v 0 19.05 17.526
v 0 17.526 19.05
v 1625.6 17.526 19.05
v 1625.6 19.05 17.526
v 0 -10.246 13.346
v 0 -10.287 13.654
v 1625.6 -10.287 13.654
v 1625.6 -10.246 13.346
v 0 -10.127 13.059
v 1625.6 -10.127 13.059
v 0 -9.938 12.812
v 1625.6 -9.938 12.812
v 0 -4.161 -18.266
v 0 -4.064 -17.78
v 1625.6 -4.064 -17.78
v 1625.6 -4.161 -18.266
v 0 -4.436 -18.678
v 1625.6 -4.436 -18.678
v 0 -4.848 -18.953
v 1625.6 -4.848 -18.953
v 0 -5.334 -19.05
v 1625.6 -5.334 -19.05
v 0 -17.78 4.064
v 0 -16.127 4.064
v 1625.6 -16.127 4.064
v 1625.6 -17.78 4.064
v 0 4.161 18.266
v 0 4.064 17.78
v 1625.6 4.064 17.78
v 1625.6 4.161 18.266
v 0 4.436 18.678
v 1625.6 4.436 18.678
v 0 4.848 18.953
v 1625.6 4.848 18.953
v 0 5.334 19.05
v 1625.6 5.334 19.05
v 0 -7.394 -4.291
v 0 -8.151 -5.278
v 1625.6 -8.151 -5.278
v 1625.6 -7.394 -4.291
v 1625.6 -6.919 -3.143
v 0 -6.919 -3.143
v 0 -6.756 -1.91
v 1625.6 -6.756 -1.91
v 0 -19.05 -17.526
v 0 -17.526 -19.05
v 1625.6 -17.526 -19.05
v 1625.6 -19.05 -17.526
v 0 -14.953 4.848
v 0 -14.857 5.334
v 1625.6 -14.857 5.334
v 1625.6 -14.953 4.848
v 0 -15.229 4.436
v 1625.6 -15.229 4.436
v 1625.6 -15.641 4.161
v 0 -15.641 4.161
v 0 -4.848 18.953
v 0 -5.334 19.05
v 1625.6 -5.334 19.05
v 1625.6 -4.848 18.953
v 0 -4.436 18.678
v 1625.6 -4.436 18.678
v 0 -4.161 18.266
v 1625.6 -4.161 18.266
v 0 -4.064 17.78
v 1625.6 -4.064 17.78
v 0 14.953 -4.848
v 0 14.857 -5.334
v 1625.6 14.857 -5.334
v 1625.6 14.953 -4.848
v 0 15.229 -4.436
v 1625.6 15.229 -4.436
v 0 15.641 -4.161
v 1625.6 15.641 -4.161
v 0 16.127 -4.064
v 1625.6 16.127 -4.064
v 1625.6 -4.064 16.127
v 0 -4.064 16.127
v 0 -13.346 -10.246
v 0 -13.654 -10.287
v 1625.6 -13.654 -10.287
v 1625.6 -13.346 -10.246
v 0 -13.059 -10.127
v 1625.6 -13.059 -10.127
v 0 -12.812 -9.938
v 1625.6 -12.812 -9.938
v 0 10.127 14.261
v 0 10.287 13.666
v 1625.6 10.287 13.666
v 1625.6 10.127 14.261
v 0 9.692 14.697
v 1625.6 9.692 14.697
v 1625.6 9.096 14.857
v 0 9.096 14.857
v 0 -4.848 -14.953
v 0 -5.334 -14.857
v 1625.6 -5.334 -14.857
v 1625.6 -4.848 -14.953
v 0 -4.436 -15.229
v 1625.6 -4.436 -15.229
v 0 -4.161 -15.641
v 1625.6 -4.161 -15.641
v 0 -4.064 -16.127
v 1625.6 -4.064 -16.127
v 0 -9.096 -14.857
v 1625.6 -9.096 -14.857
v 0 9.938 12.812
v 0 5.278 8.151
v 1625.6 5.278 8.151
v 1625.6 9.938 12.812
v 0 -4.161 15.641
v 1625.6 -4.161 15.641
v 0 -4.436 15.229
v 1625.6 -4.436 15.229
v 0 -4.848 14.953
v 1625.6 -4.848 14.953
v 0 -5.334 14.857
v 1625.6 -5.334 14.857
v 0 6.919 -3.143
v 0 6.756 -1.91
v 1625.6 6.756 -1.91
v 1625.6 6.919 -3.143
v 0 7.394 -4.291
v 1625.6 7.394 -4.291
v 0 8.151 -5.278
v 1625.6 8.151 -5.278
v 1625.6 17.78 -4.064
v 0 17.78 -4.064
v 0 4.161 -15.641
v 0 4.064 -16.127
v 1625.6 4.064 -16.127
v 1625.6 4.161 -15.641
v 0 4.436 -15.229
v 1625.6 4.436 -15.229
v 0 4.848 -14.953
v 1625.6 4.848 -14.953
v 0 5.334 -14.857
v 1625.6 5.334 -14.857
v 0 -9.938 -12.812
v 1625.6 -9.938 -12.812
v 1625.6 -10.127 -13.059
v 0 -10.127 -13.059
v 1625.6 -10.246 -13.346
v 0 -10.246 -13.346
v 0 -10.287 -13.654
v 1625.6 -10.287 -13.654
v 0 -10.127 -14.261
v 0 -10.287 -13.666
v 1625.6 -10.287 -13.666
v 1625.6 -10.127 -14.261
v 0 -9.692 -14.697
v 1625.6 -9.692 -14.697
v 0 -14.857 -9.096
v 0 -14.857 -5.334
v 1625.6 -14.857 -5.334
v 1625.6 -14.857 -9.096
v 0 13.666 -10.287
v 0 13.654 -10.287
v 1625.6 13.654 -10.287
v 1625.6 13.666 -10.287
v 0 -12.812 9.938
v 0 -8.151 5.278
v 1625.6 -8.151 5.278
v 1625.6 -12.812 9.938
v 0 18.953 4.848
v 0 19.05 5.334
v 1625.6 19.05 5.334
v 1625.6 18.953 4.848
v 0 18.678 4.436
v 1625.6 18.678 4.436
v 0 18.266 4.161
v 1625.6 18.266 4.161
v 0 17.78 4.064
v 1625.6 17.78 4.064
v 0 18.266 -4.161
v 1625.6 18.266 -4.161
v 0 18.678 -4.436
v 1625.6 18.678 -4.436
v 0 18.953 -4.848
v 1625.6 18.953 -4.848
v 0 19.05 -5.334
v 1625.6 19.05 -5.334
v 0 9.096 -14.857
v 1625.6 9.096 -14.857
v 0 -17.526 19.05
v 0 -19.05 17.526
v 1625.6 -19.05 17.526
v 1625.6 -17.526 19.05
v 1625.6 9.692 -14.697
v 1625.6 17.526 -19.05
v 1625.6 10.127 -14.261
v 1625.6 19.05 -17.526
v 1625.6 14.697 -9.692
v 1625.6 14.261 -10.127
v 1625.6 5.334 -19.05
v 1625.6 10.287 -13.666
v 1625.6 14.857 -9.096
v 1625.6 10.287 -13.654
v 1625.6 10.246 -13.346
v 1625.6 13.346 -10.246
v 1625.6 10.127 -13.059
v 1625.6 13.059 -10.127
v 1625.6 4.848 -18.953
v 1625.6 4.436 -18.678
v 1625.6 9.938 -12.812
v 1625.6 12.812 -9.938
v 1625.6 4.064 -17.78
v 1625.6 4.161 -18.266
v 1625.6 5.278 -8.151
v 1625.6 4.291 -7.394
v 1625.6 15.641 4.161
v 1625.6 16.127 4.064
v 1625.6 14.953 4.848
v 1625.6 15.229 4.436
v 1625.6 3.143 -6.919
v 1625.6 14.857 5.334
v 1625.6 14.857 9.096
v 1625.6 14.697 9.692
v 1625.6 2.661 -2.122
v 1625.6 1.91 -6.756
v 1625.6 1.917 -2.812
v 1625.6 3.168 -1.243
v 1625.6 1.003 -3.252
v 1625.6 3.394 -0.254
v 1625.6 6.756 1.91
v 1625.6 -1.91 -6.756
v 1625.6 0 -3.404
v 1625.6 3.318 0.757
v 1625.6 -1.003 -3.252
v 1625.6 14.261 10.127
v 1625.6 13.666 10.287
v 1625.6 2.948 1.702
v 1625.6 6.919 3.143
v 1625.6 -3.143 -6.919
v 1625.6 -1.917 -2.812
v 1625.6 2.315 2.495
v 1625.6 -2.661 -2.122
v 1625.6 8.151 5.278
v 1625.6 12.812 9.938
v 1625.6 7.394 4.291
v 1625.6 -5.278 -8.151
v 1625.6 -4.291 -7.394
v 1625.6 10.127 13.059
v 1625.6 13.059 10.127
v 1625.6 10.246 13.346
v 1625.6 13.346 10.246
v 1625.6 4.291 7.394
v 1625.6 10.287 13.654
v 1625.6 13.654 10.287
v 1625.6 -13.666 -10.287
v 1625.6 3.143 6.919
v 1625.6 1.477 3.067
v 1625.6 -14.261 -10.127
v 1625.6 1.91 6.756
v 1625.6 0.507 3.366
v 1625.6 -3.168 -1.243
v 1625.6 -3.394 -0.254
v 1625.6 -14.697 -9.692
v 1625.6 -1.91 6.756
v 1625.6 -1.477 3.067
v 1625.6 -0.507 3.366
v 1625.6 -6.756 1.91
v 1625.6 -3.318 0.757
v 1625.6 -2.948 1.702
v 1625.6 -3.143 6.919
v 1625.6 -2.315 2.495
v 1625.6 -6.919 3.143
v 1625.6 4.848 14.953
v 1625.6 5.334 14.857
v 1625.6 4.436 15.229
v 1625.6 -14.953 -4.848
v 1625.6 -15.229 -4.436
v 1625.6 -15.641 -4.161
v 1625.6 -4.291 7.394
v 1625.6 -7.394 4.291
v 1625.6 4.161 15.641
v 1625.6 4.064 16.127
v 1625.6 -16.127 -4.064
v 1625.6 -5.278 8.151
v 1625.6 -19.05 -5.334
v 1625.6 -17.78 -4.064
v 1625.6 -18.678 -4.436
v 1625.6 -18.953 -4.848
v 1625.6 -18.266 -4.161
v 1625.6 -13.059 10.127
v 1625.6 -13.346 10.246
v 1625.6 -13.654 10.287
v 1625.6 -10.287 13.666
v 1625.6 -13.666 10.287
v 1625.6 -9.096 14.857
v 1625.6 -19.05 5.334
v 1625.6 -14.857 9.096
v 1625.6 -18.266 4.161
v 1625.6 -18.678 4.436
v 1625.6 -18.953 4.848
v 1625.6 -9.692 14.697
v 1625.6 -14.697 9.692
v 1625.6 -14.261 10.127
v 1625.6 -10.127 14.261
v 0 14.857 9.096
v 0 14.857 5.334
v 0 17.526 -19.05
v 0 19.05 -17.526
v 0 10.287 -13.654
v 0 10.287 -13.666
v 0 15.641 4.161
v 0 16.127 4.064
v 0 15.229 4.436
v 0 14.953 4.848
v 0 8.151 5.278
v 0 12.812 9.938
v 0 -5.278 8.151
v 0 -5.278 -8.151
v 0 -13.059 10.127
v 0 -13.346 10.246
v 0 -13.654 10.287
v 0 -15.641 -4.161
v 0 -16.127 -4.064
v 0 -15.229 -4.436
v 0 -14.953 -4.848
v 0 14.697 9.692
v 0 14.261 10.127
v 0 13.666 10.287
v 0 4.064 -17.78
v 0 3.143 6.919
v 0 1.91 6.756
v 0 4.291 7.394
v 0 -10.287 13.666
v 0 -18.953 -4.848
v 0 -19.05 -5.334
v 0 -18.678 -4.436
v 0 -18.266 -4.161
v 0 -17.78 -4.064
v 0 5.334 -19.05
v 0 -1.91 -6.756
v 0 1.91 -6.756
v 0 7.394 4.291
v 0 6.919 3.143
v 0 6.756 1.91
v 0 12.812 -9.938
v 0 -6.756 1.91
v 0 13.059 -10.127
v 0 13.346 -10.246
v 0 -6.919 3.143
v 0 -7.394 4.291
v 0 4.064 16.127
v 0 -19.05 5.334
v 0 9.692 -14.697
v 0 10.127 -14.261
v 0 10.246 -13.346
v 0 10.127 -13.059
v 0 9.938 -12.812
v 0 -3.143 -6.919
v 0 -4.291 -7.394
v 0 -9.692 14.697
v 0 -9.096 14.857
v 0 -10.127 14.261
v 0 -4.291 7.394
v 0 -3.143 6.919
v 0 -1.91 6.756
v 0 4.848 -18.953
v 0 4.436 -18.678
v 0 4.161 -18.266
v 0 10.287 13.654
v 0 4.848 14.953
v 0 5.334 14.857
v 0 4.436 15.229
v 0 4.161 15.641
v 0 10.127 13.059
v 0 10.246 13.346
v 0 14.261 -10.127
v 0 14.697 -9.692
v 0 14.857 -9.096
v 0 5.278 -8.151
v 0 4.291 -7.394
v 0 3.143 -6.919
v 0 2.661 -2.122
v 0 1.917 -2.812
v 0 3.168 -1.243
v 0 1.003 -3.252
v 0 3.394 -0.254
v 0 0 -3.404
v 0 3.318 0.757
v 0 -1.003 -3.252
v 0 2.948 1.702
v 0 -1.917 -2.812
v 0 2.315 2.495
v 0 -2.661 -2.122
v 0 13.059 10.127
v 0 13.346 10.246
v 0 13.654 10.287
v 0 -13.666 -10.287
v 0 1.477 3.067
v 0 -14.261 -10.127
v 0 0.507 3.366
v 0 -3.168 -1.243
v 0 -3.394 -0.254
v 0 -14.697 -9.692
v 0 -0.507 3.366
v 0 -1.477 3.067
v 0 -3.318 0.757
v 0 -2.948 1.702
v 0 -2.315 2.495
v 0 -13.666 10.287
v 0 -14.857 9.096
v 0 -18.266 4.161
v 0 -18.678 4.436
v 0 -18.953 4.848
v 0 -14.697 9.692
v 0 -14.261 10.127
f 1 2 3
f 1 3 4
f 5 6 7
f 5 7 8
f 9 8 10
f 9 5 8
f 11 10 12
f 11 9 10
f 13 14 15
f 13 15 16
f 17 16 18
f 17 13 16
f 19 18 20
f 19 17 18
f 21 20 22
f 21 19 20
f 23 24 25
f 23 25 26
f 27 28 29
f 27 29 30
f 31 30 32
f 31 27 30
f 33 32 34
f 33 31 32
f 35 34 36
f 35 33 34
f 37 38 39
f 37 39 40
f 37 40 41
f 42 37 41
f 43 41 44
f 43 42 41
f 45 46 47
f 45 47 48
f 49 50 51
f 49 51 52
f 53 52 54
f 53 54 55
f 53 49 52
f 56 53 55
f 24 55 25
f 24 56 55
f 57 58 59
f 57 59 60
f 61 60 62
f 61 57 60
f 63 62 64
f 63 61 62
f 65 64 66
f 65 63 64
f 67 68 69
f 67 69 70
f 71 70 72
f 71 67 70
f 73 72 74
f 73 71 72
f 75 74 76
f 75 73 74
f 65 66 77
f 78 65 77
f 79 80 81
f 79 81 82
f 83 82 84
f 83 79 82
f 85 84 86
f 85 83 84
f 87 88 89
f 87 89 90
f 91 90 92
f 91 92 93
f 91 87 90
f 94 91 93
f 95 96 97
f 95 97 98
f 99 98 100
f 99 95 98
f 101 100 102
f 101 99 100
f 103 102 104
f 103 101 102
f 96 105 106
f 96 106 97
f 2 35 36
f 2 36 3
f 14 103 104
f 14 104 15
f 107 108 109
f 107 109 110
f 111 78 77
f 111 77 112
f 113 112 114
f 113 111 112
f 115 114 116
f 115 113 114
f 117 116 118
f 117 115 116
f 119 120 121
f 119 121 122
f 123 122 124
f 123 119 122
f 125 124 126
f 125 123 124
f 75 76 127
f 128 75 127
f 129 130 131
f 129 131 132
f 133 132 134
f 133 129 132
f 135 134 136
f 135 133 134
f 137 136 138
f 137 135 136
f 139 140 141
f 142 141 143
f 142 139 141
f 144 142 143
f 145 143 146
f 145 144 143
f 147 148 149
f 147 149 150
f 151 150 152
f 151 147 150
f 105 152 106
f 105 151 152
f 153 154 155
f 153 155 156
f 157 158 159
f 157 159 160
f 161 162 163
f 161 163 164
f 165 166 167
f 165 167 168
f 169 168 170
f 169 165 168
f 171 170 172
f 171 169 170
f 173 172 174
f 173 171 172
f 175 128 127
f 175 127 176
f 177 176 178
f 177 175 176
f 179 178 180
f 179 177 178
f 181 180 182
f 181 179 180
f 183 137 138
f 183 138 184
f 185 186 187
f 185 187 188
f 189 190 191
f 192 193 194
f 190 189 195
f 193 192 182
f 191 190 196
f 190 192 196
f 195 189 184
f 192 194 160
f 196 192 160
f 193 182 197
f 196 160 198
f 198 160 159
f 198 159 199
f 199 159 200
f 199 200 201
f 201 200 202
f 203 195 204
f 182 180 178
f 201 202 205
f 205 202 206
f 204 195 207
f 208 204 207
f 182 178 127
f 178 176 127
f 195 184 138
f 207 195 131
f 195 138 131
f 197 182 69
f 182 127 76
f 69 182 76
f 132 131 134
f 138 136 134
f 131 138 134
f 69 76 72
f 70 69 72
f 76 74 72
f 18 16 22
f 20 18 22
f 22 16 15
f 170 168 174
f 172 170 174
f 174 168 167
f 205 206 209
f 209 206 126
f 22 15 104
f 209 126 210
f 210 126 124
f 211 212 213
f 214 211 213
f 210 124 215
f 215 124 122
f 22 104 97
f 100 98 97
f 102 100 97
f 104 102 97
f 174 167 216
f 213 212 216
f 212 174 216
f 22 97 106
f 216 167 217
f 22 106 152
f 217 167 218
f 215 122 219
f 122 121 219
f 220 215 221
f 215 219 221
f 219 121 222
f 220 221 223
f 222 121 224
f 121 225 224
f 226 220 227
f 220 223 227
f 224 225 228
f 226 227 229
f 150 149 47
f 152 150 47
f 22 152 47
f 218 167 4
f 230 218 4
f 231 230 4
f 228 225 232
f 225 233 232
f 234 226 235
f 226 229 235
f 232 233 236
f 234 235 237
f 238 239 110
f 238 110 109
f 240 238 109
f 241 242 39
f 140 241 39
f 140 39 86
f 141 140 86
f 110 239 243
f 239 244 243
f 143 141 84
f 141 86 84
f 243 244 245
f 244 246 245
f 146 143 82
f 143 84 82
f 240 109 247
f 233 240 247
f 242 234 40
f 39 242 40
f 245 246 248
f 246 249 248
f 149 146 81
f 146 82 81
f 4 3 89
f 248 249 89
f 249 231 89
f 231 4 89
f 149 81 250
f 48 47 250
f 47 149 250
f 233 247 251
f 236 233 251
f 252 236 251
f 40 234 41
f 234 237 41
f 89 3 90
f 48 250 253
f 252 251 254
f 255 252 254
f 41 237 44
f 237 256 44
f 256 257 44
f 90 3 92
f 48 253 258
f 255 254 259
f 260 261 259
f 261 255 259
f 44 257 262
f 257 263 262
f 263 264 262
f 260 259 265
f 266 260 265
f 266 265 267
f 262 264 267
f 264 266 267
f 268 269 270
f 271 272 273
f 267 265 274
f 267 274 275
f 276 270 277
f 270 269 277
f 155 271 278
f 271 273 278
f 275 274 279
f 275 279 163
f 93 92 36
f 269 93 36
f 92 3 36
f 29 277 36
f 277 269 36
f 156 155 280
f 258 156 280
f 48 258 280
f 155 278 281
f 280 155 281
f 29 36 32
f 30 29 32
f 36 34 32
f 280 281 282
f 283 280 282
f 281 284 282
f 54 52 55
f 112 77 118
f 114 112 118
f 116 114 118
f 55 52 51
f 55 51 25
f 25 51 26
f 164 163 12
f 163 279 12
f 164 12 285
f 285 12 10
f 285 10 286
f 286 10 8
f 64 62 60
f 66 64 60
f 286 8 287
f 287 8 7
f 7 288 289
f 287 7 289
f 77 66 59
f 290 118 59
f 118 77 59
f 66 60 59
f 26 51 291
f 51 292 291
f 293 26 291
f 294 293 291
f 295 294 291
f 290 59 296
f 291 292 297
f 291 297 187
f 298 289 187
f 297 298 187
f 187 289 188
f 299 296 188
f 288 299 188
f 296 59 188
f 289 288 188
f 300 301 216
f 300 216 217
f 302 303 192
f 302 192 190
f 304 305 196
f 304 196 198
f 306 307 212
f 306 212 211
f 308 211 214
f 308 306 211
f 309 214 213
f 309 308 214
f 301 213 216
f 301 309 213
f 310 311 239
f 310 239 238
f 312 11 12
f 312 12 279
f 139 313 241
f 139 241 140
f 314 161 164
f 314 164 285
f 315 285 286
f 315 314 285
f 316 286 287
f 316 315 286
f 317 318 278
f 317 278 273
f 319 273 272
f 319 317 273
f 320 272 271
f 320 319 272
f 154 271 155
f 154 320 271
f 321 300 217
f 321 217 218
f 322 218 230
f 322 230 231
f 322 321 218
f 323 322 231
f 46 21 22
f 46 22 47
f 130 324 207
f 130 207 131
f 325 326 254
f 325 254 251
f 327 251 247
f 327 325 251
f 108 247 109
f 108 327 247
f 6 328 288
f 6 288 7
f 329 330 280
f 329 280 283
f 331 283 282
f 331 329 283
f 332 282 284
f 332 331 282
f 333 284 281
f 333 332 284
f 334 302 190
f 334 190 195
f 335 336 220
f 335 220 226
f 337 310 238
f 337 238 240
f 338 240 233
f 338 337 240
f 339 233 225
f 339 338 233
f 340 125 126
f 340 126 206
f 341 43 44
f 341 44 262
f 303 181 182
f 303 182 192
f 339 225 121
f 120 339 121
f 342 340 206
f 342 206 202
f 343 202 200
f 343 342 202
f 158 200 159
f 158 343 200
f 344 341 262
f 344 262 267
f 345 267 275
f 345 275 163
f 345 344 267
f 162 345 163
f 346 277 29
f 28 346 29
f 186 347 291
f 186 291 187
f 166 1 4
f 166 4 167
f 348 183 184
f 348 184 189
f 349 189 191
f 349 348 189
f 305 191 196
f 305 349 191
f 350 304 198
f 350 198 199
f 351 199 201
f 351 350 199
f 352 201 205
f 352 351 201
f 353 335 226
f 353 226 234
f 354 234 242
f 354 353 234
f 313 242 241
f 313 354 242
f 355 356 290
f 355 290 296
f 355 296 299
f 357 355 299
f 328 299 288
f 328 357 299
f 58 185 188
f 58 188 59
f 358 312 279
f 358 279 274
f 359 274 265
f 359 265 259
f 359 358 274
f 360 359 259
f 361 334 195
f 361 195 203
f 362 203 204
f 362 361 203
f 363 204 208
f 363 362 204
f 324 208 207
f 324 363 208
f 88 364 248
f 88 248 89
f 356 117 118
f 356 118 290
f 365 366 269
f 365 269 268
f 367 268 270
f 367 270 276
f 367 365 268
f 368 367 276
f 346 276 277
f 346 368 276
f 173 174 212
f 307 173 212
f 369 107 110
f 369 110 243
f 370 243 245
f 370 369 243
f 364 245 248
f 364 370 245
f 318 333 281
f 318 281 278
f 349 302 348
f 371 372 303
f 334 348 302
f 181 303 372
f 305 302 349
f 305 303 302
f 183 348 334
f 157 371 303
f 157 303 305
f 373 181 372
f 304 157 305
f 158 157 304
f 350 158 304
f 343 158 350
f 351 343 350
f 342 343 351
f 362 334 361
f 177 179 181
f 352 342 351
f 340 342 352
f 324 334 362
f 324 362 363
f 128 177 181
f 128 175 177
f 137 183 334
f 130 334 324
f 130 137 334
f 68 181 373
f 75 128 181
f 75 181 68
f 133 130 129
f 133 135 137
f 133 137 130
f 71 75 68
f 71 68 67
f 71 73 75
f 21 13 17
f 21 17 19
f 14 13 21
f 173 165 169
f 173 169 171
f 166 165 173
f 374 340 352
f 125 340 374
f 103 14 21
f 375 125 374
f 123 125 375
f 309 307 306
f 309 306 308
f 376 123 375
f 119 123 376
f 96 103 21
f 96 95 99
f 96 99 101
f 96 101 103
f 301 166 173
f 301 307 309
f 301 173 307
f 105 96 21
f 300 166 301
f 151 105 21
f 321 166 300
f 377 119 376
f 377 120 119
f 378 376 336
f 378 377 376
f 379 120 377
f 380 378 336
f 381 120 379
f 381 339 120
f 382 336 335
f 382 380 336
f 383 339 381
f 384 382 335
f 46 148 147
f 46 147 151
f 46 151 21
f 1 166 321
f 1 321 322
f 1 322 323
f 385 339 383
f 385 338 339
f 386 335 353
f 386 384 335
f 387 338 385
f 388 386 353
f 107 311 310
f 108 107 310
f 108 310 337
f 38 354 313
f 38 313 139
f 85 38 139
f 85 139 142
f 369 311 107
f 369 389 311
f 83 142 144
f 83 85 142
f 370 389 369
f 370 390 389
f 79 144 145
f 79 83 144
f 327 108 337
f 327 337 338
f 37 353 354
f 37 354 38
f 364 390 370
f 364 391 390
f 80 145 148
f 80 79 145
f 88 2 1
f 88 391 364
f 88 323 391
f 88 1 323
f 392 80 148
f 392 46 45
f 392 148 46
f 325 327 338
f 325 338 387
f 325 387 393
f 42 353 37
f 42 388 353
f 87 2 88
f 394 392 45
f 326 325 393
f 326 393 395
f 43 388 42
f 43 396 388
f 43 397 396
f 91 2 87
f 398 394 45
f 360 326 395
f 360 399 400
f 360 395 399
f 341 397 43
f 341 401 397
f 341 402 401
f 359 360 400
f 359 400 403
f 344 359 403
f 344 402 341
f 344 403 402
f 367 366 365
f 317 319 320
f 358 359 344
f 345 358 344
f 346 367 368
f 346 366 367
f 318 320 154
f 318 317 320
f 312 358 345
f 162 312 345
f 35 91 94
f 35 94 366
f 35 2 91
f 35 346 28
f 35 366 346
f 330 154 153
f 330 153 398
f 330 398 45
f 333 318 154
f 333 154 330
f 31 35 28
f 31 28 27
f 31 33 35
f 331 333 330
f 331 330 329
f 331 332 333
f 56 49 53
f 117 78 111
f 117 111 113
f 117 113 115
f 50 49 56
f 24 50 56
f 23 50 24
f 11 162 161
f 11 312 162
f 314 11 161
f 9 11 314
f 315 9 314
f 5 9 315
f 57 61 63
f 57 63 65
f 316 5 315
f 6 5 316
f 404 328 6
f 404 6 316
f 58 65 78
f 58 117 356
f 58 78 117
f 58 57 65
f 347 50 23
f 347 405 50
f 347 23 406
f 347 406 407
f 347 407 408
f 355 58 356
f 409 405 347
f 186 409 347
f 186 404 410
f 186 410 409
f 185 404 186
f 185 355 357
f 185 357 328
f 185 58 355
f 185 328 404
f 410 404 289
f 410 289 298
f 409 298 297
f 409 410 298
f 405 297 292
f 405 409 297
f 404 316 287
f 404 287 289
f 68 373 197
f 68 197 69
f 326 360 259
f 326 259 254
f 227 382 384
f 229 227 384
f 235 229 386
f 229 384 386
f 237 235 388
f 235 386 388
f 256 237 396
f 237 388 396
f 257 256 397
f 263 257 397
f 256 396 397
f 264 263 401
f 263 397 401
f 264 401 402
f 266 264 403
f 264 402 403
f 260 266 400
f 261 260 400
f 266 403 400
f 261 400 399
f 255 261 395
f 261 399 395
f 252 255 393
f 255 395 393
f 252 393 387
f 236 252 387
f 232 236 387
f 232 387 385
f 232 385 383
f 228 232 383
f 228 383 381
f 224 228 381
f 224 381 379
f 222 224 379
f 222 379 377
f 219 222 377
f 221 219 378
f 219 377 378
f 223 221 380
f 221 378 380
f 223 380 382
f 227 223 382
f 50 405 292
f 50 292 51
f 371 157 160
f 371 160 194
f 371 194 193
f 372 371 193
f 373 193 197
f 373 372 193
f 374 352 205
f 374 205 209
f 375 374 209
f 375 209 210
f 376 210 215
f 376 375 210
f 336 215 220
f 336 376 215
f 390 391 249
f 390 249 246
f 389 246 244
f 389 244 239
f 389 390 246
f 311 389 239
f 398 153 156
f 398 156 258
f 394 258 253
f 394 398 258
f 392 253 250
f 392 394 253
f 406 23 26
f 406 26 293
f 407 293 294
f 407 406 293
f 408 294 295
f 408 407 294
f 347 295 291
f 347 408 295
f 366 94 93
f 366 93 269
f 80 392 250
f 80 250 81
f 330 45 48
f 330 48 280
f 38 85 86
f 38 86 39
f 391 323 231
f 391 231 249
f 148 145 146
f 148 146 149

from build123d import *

# Parameters (mm, degrees)
SKETCH1_R           = 3.4036
BOSS_EXTRUDE1_DEPTH = 1625.6


with BuildPart() as part:
    # Sketch1 → Boss-Extrude1 (new body)
    with BuildSketch(Plane(origin=(0, 0, 0), x_dir=(0, -1, 0), z_dir=(-1, 0, 0))):
        with BuildLine():
            Line((19.05, 5.333992226), (19.05, 17.526))
            Line((19.05, 17.526), (17.526, 19.05))
            Line((17.526, 19.05), (5.333991729, 19.05))
            ThreePointArc((5.333991729, 19.05), (4.435966117, 18.678025612), (4.063991729, 17.78))
            Line((4.063991729, 17.78), (4.063991729, 16.12658277))
            ThreePointArc((4.063991729, 16.12658277), (4.435966117, 15.228557158), (5.333991729, 14.85658277))
            Line((5.333991729, 14.85658277), (9.096353874, 14.85658277))
            ThreePointArc((9.096353874, 14.85658277), (9.938252886, 14.507856781), (10.286978874, 13.66595777))
            Line((10.286978874, 13.66595777), (10.286978874, 13.653830065))
            ThreePointArc((10.286978874, 13.653830065), (10.196347959, 13.198197641), (9.938252944, 12.811931112))
            Line((9.938252944, 12.811931112), (5.277611896, 8.151289413))
            ThreePointArc((5.277611896, 8.151289413), (3.732545616, 7.118909013), (1.910015615, 6.756385223))
            Line((1.910015615, 6.756385223), (-1.910018596, 6.756385223))
            ThreePointArc((-1.910018596, 6.756385223), (-3.732548289, 7.118908885), (-5.277614406, 8.151288942))
            Line((-5.277614406, 8.151288942), (-9.93825393, 12.811927815))
            ThreePointArc((-9.93825393, 12.811927815), (-10.19634903, 13.198194385), (-10.286979978, 13.653826886))
            Line((-10.286979978, 13.653826886), (-10.286979978, 13.66595777))
            ThreePointArc((-10.286979978, 13.66595777), (-9.938253989, 14.507856781), (-9.096354978, 14.85658277))
            Line((-9.096354978, 14.85658277), (-5.333992226, 14.85658277))
            ThreePointArc((-5.333992226, 14.85658277), (-4.435966614, 15.228557158), (-4.063992226, 16.12658277))
            Line((-4.063992226, 16.12658277), (-4.063992226, 17.78))
            ThreePointArc((-4.063992226, 17.78), (-4.435966614, 18.678025612), (-5.333992226, 19.05))
            Line((-5.333992226, 19.05), (-17.526, 19.05))
            Line((-17.526, 19.05), (-19.05, 17.526))
            Line((-19.05, 17.526), (-19.05, 5.333992226))
            ThreePointArc((-19.05, 5.333992226), (-18.678025612, 4.435966614), (-17.78, 4.063992226))
            Line((-17.78, 4.063992226), (-16.12658277, 4.063992226))
            ThreePointArc((-16.12658277, 4.063992226), (-15.228557158, 4.435966614), (-14.85658277, 5.333992226))
            Line((-14.85658277, 5.333992226), (-14.85658277, 9.096354978))
            ThreePointArc((-14.85658277, 9.096354978), (-14.507856781, 9.938253989), (-13.66595777, 10.286979978))
            Line((-13.66595777, 10.286979978), (-13.653827218, 10.286979978))
            ThreePointArc((-13.653827218, 10.286979978), (-13.198194795, 10.196349062), (-12.811928266, 9.938254048))
            Line((-12.811928266, 9.938254048), (-8.151289413, 5.277615846))
            ThreePointArc((-8.151289413, 5.277615846), (-7.118909013, 3.732549566), (-6.756385223, 1.910019566))
            Line((-6.756385223, 1.910019566), (-6.756385223, -1.910017492))
            ThreePointArc((-6.756385223, -1.910017492), (-7.118908885, -3.732547185), (-8.151288942, -5.277613302))
            Line((-8.151288942, -5.277613302), (-12.811927815, -9.938252827))
            ThreePointArc((-12.811927815, -9.938252827), (-13.198194385, -10.196347927), (-13.653826886, -10.286978874))
            Line((-13.653826886, -10.286978874), (-13.66595777, -10.286978874))
            ThreePointArc((-13.66595777, -10.286978874), (-14.507856781, -9.938252886), (-14.85658277, -9.096353874))
            Line((-14.85658277, -9.096353874), (-14.85658277, -5.333991729))
            ThreePointArc((-14.85658277, -5.333991729), (-15.228557158, -4.435966117), (-16.12658277, -4.063991729))
            Line((-16.12658277, -4.063991729), (-17.78, -4.063991729))
            ThreePointArc((-17.78, -4.063991729), (-18.678025612, -4.435966117), (-19.05, -5.333991729))
            Line((-19.05, -5.333991729), (-19.05, -17.526))
            Line((-19.05, -17.526), (-17.526, -19.05))
            Line((-17.526, -19.05), (-5.333992226, -19.05))
            ThreePointArc((-5.333992226, -19.05), (-4.435966614, -18.678025612), (-4.063992226, -17.78))
            Line((-4.063992226, -17.78), (-4.063992226, -16.126583724))
            ThreePointArc((-4.063992226, -16.126583724), (-4.435966614, -15.228558112), (-5.333992226, -14.856583724))
            Line((-5.333992226, -14.856583724), (-9.096354978, -14.856583724))
            ThreePointArc((-9.096354978, -14.856583724), (-9.938253989, -14.507857736), (-10.286979978, -13.665958724))
            Line((-10.286979978, -13.665958724), (-10.286979978, -13.653828173))
            ThreePointArc((-10.286979978, -13.653828173), (-10.196349062, -13.198195749), (-9.938254048, -12.81192922))
            Line((-9.938254048, -12.81192922), (-5.277615159, -8.15128968))
            ThreePointArc((-5.277615159, -8.15128968), (-3.732548878, -7.11890928), (-1.910018878, -6.75638549))
            Line((-1.910018878, -6.75638549), (1.910021709, -6.75638549))
            ThreePointArc((1.910021709, -6.75638549), (3.732551402, -7.118909152), (5.277617519, -8.151289209))
            Line((5.277617519, -8.151289209), (9.938252827, -12.811923865))
            ThreePointArc((9.938252827, -12.811923865), (10.196347927, -13.198190435), (10.286978874, -13.653822935))
            Line((10.286978874, -13.653822935), (10.286978874, -13.665958724))
            ThreePointArc((10.286978874, -13.665958724), (9.938252886, -14.507857736), (9.096353874, -14.856583724))
            Line((9.096353874, -14.856583724), (5.333991729, -14.856583724))
            ThreePointArc((5.333991729, -14.856583724), (4.435966117, -15.228558112), (4.063991729, -16.126583724))
            Line((4.063991729, -16.126583724), (4.063991729, -17.78))
            ThreePointArc((4.063991729, -17.78), (4.435966117, -18.678025612), (5.333991729, -19.05))
            Line((5.333991729, -19.05), (17.526, -19.05))
            Line((17.526, -19.05), (19.05, -17.526))
            Line((19.05, -17.526), (19.05, -5.333991729))
            ThreePointArc((19.05, -5.333991729), (18.678025612, -4.435966117), (17.78, -4.063991729))
            Line((17.78, -4.063991729), (16.126583724, -4.063991729))
            ThreePointArc((16.126583724, -4.063991729), (15.228558112, -4.435966117), (14.856583724, -5.333991729))
            Line((14.856583724, -5.333991729), (14.856583724, -9.096353874))
            ThreePointArc((14.856583724, -9.096353874), (14.507857736, -9.938252886), (13.665958724, -10.286978874))
            Line((13.665958724, -10.286978874), (13.653828961, -10.286978874))
            ThreePointArc((13.653828961, -10.286978874), (13.198196538, -10.196347959), (12.811930009, -9.938252944))
            Line((12.811930009, -9.938252944), (8.151290074, -5.277613661))
            ThreePointArc((8.151290074, -5.277613661), (7.118909674, -3.732547381), (6.756385884, -1.91001738))
            Line((6.756385884, -1.91001738), (6.756385884, 1.910021149))
            ThreePointArc((6.756385884, 1.910021149), (7.118909547, 3.732550842), (8.151289603, 5.277616959))
            Line((8.151289603, 5.277616959), (12.811925923, 9.93825393))
            ThreePointArc((12.811925923, 9.93825393), (13.198192493, 10.19634903), (13.653824993, 10.286979978))
            Line((13.653824993, 10.286979978), (13.665958724, 10.286979978))
            ThreePointArc((13.665958724, 10.286979978), (14.507857736, 9.938253989), (14.856583724, 9.096354978))
            Line((14.856583724, 9.096354978), (14.856583724, 5.333992226))
            ThreePointArc((14.856583724, 5.333992226), (15.228558112, 4.435966614), (16.126583724, 4.063992226))
            Line((16.126583724, 4.063992226), (17.78, 4.063992226))
            ThreePointArc((17.78, 4.063992226), (18.678025612, 4.435966614), (19.05, 5.333992226))
        make_face()
        with Locations(Location((0, 0, 0), (0, 0, 270))):
            Circle(SKETCH1_R, mode=Mode.SUBTRACT)
    extrude(amount=-BOSS_EXTRUDE1_DEPTH)


solid = part.part
